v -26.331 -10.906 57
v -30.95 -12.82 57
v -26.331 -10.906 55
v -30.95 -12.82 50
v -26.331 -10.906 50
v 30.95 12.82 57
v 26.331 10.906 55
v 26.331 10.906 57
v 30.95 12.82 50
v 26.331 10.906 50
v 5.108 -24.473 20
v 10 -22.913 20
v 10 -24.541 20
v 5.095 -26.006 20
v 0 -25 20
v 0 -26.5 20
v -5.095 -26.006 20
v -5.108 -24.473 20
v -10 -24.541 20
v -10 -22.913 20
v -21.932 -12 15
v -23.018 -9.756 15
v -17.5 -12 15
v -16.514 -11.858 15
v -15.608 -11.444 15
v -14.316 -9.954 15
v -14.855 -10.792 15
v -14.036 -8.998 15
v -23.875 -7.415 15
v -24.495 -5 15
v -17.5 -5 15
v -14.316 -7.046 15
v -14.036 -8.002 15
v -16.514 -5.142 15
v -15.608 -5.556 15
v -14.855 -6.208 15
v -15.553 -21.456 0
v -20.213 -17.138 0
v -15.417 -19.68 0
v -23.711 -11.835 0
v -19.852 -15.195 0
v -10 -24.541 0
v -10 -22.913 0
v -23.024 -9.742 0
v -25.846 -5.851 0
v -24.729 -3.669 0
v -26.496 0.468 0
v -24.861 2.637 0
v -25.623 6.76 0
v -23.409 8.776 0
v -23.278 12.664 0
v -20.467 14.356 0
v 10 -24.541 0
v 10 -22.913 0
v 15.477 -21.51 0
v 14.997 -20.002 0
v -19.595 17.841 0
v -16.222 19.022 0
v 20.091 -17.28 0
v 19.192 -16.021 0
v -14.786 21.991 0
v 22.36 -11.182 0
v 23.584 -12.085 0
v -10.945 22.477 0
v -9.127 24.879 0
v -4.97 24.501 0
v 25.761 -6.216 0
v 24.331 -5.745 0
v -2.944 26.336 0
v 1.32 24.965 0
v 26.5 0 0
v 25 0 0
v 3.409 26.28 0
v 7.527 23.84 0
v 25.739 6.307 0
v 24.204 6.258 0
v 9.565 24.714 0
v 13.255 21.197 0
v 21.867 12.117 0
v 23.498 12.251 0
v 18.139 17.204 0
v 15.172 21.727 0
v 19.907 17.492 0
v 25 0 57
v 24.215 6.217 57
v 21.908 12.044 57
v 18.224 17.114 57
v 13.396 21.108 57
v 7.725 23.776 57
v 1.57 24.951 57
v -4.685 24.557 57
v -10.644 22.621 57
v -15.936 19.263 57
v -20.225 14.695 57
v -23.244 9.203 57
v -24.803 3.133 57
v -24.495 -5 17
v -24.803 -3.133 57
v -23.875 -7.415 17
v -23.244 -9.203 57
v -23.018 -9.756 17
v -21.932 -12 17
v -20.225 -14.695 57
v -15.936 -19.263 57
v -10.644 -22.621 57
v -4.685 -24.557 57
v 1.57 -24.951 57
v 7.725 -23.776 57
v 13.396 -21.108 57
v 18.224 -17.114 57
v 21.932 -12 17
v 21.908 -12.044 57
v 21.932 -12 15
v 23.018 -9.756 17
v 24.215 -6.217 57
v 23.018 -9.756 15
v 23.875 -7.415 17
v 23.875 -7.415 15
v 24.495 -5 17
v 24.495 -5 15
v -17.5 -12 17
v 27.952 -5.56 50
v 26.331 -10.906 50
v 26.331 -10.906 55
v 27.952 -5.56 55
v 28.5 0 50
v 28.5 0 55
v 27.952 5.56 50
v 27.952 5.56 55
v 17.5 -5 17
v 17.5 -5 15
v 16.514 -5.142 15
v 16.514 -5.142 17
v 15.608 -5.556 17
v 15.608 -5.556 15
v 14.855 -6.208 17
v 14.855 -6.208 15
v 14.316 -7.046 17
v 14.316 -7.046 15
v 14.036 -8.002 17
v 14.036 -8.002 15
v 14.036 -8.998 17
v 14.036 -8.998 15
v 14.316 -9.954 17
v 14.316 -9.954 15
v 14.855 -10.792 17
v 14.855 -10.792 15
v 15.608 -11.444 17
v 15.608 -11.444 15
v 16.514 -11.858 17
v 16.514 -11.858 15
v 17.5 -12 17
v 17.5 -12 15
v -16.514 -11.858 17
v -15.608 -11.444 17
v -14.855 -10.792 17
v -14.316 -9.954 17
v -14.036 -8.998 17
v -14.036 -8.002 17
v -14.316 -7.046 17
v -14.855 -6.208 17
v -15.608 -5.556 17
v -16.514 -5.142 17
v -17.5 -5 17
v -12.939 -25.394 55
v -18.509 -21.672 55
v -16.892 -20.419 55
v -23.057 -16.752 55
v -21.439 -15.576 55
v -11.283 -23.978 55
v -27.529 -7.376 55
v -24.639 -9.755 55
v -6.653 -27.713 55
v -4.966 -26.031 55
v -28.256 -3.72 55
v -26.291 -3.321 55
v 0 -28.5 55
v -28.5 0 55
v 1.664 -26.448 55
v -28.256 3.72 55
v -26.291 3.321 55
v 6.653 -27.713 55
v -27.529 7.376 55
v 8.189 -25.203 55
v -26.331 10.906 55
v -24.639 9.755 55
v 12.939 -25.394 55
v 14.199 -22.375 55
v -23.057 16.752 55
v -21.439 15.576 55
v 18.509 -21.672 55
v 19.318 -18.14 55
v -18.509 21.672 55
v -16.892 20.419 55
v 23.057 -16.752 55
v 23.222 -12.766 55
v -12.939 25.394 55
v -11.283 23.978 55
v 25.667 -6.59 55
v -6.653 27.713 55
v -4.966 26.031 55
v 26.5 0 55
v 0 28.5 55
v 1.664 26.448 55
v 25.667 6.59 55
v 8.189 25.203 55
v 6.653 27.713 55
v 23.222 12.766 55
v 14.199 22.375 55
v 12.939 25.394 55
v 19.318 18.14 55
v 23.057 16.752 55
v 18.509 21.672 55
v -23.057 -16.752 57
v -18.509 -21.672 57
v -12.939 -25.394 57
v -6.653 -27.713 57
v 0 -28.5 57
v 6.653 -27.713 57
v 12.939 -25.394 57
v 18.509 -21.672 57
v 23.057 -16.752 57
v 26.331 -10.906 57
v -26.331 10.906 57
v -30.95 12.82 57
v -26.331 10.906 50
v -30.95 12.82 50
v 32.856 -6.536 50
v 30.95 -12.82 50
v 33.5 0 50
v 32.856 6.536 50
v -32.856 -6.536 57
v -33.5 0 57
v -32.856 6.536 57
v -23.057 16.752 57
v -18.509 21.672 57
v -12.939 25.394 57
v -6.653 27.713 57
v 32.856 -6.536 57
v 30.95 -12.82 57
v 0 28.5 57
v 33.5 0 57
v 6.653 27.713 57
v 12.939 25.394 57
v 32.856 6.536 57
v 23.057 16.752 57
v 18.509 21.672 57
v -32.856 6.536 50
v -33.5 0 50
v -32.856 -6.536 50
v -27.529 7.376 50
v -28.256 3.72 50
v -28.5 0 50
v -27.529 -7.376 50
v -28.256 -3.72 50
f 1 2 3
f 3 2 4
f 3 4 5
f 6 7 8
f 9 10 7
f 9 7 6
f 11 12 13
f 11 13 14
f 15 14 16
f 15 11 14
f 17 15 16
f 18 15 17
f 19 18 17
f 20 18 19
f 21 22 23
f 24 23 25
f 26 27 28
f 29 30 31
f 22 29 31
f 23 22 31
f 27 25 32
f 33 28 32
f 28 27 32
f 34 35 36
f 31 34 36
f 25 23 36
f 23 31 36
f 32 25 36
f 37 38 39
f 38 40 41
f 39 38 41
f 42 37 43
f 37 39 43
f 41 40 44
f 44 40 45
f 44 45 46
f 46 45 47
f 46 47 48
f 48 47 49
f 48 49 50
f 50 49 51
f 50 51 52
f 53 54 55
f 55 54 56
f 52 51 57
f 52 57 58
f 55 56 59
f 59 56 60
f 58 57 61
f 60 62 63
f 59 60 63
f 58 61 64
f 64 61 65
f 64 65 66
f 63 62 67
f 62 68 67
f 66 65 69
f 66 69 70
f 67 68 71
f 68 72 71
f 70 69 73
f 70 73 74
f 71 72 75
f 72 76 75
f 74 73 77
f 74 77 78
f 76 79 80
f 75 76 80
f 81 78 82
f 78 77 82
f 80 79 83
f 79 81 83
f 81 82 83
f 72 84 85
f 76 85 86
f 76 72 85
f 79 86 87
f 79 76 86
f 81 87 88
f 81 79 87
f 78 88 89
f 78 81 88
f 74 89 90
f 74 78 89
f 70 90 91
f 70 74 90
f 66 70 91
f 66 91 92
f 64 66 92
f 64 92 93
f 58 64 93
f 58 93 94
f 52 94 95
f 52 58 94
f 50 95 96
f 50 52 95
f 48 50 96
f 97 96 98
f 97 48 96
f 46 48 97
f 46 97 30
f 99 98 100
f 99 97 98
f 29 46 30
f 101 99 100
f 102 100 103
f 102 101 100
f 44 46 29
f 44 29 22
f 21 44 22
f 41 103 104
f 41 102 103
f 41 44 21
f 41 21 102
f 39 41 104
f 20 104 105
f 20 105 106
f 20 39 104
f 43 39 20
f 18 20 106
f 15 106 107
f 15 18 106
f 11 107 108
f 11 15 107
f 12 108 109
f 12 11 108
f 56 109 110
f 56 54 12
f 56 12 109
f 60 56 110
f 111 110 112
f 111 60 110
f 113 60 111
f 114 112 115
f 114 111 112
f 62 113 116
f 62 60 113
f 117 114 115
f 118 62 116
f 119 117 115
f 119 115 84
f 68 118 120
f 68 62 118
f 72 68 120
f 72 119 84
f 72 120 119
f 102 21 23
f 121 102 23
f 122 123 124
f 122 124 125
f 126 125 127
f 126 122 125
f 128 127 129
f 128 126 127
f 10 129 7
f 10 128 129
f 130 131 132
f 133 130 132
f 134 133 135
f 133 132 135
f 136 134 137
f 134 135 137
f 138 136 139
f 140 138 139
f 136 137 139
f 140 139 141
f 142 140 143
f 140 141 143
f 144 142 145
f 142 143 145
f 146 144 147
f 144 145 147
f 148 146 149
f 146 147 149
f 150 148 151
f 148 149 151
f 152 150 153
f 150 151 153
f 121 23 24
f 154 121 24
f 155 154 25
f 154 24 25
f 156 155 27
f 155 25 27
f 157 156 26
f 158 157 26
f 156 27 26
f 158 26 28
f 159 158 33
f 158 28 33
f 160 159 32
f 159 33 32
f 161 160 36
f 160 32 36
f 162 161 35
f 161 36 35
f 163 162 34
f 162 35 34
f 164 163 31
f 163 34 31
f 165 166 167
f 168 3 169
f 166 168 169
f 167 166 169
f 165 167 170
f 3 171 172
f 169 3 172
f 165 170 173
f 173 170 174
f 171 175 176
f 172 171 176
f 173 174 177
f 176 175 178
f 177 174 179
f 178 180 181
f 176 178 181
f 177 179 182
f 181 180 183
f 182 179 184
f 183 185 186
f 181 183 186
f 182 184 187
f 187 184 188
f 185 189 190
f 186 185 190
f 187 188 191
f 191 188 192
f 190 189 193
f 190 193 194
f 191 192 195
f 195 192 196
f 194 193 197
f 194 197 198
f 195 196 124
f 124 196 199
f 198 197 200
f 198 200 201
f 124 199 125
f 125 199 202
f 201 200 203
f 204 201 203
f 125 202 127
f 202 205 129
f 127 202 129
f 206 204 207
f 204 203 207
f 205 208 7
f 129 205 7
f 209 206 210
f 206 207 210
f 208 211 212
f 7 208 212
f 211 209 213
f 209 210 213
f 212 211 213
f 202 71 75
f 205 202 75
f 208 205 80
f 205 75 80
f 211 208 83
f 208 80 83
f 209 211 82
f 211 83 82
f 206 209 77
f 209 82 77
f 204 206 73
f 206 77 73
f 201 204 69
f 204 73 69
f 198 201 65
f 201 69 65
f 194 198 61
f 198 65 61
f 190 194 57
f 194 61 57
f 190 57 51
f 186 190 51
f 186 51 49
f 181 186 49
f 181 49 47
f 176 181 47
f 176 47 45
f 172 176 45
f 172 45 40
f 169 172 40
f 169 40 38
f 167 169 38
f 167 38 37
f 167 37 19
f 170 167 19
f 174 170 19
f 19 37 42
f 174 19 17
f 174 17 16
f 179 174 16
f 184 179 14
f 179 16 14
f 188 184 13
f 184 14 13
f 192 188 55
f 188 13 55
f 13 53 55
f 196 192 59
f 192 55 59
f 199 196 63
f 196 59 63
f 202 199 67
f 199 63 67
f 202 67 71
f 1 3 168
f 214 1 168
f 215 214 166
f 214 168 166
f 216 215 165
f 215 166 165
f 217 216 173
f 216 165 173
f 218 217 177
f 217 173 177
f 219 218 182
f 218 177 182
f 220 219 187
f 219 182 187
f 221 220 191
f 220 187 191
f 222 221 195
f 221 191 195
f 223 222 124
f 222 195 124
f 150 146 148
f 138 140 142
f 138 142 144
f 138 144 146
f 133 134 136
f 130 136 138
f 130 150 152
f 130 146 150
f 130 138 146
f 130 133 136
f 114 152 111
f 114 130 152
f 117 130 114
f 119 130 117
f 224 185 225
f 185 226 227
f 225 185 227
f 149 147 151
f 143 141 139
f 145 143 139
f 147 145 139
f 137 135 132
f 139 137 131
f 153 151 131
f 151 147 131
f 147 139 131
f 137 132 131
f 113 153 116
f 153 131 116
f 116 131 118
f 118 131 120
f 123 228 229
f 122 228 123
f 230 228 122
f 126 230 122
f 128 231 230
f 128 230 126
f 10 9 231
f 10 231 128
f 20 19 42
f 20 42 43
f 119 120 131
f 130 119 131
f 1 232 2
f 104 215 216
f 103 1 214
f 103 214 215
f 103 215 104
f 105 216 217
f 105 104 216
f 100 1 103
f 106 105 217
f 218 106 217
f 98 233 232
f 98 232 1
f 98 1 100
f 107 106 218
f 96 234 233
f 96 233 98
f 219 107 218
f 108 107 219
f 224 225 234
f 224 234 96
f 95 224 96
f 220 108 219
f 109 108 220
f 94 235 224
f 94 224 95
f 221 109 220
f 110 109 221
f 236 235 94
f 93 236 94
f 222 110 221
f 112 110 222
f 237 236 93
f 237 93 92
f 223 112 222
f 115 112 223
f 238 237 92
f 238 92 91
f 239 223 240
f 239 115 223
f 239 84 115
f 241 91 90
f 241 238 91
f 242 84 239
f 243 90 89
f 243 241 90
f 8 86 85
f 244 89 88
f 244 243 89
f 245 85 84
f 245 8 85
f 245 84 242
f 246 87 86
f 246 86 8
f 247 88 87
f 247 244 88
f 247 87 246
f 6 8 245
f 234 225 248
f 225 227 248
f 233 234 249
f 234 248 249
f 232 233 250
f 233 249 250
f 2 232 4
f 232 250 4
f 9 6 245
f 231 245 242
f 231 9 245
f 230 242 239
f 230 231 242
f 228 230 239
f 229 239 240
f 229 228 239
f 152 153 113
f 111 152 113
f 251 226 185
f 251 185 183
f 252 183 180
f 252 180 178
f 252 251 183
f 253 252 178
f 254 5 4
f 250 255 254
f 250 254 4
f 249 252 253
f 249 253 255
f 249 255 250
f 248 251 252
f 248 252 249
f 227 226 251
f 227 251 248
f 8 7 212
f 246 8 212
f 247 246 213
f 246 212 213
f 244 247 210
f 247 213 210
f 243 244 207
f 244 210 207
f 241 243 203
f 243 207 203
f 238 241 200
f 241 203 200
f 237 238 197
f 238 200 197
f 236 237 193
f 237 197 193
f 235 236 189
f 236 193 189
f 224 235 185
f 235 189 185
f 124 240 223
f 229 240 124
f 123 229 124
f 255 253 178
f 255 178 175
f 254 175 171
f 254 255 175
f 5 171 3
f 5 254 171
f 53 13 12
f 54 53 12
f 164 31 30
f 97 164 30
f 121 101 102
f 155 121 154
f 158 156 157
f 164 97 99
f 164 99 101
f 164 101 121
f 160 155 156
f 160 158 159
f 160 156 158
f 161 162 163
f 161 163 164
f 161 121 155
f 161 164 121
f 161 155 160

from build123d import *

# Parameters (mm, degrees)
SKETCH1_R           = 26.5
SKETCH1_R_2         = 25
BOSS_EXTRUDE1_DEPTH = 55
SKETCH2_R           = 25
BOSS_EXTRUDE2_DEPTH = 2
BOSS_EXTRUDE3_START = 5
BOSS_EXTRUDE3_DEPTH = 5
SKETCH5_W           = 20
SKETCH5_H           = 10
CUT_EXTRUDE1_DEPTH  = 68
BOSS_EXTRUDE4_DEPTH = 2


with BuildPart() as part:
    # Sketch1 → Boss-Extrude1 (new body)
    with BuildSketch(Plane.XY):
        Circle(SKETCH1_R)
        Circle(SKETCH1_R_2, mode=Mode.SUBTRACT)
    extrude(amount=BOSS_EXTRUDE1_DEPTH)

    # Sketch2 → Boss-Extrude2 (add)
    with BuildSketch(Plane.XY.offset(55)):
        with BuildLine():
            Line((-26.330566677, 10.906477822), (-30.949964339, 12.819894984))
            ThreePointArc((-30.949964339, 12.819894984), (-33.5, 0), (-30.949964339, -12.819894984))
            Line((-30.949964339, -12.819894984), (-26.330566677, -10.906477822))
            ThreePointArc((-26.330566677, -10.906477822), (0, -28.5), (26.330566677, -10.906477822))
            Line((26.330566677, -10.906477822), (30.949964339, -12.819894984))
            ThreePointArc((30.949964339, -12.819894984), (33.5, 0), (30.949964339, 12.819894984))
            Line((30.949964339, 12.819894984), (26.330566677, 10.906477822))
            ThreePointArc((26.330566677, 10.906477822), (0, 28.5), (-26.330566677, 10.906477822))
        make_face()
        Circle(SKETCH2_R, mode=Mode.SUBTRACT)
    extrude(amount=BOSS_EXTRUDE2_DEPTH)

    # Sketch3 → Boss-Extrude3 (add)
    with BuildSketch(Plane(origin=(0, 0, 55), x_dir=(-1, 0, 0), z_dir=(0, 0, -1)).offset(BOSS_EXTRUDE3_START)):
        with BuildLine():
            ThreePointArc((-26.330566677, -10.906477822), (-28.5, 0), (-26.330566677, 10.906477822))
            Line((-26.330566677, 10.906477822), (-30.949964339, 12.819894984))
            ThreePointArc((-30.949964339, 12.819894984), (-33.5, 0), (-30.949964339, -12.819894984))
            Line((-30.949964339, -12.819894984), (-26.330566677, -10.906477822))
        make_face()
        with BuildLine():
            Line((30.949964339, 12.819894984), (26.330566677, 10.906477822))
            ThreePointArc((26.330566677, 10.906477822), (27.952380491, 5.560074177), (28.5, 0))
            ThreePointArc((28.5, 0), (27.952380491, -5.560074177), (26.330566677, -10.906477822))
            Line((26.330566677, -10.906477822), (30.949964339, -12.819894984))
            ThreePointArc((30.949964339, -12.819894984), (33.5, 0), (30.949964339, 12.819894984))
        make_face()
    extrude(amount=-BOSS_EXTRUDE3_DEPTH)

    # Sketch5 → Cut-Extrude1 (cut)
    with BuildSketch(Plane(origin=(0, 0, 20), x_dir=(-1, 0, 0), z_dir=(0, 0, -1))):
        with Locations((0, -25)):
            Rectangle(SKETCH5_W, SKETCH5_H)
    extrude(amount=CUT_EXTRUDE1_DEPTH, mode=Mode.SUBTRACT)

    # Sketch7 → Boss-Extrude4 (add)
    with BuildSketch(Plane(origin=(0, 0, 15), x_dir=(-1, 0, 0), z_dir=(0, 0, -1))):
        with BuildLine():
            ThreePointArc((-21.931712199, -12), (-23.475679338, -8.596073501), (-24.494897428, -5))
            Line((-24.494897428, -5), (-17.5, -5))
            ThreePointArc((-17.5, -5), (-14, -8.5), (-17.5, -12))
            Line((-17.5, -12), (-21.931712199, -12))
        make_face()
        with BuildLine():
            Line((21.931712199, -12), (17.5, -12))
            ThreePointArc((17.5, -12), (14, -8.5), (17.5, -5))
            Line((17.5, -5), (24.494897428, -5))
            ThreePointArc((24.494897428, -5), (23.475679338, -8.596073501), (21.931712199, -12))
        make_face()
    extrude(amount=-BOSS_EXTRUDE4_DEPTH)


solid = part.part
